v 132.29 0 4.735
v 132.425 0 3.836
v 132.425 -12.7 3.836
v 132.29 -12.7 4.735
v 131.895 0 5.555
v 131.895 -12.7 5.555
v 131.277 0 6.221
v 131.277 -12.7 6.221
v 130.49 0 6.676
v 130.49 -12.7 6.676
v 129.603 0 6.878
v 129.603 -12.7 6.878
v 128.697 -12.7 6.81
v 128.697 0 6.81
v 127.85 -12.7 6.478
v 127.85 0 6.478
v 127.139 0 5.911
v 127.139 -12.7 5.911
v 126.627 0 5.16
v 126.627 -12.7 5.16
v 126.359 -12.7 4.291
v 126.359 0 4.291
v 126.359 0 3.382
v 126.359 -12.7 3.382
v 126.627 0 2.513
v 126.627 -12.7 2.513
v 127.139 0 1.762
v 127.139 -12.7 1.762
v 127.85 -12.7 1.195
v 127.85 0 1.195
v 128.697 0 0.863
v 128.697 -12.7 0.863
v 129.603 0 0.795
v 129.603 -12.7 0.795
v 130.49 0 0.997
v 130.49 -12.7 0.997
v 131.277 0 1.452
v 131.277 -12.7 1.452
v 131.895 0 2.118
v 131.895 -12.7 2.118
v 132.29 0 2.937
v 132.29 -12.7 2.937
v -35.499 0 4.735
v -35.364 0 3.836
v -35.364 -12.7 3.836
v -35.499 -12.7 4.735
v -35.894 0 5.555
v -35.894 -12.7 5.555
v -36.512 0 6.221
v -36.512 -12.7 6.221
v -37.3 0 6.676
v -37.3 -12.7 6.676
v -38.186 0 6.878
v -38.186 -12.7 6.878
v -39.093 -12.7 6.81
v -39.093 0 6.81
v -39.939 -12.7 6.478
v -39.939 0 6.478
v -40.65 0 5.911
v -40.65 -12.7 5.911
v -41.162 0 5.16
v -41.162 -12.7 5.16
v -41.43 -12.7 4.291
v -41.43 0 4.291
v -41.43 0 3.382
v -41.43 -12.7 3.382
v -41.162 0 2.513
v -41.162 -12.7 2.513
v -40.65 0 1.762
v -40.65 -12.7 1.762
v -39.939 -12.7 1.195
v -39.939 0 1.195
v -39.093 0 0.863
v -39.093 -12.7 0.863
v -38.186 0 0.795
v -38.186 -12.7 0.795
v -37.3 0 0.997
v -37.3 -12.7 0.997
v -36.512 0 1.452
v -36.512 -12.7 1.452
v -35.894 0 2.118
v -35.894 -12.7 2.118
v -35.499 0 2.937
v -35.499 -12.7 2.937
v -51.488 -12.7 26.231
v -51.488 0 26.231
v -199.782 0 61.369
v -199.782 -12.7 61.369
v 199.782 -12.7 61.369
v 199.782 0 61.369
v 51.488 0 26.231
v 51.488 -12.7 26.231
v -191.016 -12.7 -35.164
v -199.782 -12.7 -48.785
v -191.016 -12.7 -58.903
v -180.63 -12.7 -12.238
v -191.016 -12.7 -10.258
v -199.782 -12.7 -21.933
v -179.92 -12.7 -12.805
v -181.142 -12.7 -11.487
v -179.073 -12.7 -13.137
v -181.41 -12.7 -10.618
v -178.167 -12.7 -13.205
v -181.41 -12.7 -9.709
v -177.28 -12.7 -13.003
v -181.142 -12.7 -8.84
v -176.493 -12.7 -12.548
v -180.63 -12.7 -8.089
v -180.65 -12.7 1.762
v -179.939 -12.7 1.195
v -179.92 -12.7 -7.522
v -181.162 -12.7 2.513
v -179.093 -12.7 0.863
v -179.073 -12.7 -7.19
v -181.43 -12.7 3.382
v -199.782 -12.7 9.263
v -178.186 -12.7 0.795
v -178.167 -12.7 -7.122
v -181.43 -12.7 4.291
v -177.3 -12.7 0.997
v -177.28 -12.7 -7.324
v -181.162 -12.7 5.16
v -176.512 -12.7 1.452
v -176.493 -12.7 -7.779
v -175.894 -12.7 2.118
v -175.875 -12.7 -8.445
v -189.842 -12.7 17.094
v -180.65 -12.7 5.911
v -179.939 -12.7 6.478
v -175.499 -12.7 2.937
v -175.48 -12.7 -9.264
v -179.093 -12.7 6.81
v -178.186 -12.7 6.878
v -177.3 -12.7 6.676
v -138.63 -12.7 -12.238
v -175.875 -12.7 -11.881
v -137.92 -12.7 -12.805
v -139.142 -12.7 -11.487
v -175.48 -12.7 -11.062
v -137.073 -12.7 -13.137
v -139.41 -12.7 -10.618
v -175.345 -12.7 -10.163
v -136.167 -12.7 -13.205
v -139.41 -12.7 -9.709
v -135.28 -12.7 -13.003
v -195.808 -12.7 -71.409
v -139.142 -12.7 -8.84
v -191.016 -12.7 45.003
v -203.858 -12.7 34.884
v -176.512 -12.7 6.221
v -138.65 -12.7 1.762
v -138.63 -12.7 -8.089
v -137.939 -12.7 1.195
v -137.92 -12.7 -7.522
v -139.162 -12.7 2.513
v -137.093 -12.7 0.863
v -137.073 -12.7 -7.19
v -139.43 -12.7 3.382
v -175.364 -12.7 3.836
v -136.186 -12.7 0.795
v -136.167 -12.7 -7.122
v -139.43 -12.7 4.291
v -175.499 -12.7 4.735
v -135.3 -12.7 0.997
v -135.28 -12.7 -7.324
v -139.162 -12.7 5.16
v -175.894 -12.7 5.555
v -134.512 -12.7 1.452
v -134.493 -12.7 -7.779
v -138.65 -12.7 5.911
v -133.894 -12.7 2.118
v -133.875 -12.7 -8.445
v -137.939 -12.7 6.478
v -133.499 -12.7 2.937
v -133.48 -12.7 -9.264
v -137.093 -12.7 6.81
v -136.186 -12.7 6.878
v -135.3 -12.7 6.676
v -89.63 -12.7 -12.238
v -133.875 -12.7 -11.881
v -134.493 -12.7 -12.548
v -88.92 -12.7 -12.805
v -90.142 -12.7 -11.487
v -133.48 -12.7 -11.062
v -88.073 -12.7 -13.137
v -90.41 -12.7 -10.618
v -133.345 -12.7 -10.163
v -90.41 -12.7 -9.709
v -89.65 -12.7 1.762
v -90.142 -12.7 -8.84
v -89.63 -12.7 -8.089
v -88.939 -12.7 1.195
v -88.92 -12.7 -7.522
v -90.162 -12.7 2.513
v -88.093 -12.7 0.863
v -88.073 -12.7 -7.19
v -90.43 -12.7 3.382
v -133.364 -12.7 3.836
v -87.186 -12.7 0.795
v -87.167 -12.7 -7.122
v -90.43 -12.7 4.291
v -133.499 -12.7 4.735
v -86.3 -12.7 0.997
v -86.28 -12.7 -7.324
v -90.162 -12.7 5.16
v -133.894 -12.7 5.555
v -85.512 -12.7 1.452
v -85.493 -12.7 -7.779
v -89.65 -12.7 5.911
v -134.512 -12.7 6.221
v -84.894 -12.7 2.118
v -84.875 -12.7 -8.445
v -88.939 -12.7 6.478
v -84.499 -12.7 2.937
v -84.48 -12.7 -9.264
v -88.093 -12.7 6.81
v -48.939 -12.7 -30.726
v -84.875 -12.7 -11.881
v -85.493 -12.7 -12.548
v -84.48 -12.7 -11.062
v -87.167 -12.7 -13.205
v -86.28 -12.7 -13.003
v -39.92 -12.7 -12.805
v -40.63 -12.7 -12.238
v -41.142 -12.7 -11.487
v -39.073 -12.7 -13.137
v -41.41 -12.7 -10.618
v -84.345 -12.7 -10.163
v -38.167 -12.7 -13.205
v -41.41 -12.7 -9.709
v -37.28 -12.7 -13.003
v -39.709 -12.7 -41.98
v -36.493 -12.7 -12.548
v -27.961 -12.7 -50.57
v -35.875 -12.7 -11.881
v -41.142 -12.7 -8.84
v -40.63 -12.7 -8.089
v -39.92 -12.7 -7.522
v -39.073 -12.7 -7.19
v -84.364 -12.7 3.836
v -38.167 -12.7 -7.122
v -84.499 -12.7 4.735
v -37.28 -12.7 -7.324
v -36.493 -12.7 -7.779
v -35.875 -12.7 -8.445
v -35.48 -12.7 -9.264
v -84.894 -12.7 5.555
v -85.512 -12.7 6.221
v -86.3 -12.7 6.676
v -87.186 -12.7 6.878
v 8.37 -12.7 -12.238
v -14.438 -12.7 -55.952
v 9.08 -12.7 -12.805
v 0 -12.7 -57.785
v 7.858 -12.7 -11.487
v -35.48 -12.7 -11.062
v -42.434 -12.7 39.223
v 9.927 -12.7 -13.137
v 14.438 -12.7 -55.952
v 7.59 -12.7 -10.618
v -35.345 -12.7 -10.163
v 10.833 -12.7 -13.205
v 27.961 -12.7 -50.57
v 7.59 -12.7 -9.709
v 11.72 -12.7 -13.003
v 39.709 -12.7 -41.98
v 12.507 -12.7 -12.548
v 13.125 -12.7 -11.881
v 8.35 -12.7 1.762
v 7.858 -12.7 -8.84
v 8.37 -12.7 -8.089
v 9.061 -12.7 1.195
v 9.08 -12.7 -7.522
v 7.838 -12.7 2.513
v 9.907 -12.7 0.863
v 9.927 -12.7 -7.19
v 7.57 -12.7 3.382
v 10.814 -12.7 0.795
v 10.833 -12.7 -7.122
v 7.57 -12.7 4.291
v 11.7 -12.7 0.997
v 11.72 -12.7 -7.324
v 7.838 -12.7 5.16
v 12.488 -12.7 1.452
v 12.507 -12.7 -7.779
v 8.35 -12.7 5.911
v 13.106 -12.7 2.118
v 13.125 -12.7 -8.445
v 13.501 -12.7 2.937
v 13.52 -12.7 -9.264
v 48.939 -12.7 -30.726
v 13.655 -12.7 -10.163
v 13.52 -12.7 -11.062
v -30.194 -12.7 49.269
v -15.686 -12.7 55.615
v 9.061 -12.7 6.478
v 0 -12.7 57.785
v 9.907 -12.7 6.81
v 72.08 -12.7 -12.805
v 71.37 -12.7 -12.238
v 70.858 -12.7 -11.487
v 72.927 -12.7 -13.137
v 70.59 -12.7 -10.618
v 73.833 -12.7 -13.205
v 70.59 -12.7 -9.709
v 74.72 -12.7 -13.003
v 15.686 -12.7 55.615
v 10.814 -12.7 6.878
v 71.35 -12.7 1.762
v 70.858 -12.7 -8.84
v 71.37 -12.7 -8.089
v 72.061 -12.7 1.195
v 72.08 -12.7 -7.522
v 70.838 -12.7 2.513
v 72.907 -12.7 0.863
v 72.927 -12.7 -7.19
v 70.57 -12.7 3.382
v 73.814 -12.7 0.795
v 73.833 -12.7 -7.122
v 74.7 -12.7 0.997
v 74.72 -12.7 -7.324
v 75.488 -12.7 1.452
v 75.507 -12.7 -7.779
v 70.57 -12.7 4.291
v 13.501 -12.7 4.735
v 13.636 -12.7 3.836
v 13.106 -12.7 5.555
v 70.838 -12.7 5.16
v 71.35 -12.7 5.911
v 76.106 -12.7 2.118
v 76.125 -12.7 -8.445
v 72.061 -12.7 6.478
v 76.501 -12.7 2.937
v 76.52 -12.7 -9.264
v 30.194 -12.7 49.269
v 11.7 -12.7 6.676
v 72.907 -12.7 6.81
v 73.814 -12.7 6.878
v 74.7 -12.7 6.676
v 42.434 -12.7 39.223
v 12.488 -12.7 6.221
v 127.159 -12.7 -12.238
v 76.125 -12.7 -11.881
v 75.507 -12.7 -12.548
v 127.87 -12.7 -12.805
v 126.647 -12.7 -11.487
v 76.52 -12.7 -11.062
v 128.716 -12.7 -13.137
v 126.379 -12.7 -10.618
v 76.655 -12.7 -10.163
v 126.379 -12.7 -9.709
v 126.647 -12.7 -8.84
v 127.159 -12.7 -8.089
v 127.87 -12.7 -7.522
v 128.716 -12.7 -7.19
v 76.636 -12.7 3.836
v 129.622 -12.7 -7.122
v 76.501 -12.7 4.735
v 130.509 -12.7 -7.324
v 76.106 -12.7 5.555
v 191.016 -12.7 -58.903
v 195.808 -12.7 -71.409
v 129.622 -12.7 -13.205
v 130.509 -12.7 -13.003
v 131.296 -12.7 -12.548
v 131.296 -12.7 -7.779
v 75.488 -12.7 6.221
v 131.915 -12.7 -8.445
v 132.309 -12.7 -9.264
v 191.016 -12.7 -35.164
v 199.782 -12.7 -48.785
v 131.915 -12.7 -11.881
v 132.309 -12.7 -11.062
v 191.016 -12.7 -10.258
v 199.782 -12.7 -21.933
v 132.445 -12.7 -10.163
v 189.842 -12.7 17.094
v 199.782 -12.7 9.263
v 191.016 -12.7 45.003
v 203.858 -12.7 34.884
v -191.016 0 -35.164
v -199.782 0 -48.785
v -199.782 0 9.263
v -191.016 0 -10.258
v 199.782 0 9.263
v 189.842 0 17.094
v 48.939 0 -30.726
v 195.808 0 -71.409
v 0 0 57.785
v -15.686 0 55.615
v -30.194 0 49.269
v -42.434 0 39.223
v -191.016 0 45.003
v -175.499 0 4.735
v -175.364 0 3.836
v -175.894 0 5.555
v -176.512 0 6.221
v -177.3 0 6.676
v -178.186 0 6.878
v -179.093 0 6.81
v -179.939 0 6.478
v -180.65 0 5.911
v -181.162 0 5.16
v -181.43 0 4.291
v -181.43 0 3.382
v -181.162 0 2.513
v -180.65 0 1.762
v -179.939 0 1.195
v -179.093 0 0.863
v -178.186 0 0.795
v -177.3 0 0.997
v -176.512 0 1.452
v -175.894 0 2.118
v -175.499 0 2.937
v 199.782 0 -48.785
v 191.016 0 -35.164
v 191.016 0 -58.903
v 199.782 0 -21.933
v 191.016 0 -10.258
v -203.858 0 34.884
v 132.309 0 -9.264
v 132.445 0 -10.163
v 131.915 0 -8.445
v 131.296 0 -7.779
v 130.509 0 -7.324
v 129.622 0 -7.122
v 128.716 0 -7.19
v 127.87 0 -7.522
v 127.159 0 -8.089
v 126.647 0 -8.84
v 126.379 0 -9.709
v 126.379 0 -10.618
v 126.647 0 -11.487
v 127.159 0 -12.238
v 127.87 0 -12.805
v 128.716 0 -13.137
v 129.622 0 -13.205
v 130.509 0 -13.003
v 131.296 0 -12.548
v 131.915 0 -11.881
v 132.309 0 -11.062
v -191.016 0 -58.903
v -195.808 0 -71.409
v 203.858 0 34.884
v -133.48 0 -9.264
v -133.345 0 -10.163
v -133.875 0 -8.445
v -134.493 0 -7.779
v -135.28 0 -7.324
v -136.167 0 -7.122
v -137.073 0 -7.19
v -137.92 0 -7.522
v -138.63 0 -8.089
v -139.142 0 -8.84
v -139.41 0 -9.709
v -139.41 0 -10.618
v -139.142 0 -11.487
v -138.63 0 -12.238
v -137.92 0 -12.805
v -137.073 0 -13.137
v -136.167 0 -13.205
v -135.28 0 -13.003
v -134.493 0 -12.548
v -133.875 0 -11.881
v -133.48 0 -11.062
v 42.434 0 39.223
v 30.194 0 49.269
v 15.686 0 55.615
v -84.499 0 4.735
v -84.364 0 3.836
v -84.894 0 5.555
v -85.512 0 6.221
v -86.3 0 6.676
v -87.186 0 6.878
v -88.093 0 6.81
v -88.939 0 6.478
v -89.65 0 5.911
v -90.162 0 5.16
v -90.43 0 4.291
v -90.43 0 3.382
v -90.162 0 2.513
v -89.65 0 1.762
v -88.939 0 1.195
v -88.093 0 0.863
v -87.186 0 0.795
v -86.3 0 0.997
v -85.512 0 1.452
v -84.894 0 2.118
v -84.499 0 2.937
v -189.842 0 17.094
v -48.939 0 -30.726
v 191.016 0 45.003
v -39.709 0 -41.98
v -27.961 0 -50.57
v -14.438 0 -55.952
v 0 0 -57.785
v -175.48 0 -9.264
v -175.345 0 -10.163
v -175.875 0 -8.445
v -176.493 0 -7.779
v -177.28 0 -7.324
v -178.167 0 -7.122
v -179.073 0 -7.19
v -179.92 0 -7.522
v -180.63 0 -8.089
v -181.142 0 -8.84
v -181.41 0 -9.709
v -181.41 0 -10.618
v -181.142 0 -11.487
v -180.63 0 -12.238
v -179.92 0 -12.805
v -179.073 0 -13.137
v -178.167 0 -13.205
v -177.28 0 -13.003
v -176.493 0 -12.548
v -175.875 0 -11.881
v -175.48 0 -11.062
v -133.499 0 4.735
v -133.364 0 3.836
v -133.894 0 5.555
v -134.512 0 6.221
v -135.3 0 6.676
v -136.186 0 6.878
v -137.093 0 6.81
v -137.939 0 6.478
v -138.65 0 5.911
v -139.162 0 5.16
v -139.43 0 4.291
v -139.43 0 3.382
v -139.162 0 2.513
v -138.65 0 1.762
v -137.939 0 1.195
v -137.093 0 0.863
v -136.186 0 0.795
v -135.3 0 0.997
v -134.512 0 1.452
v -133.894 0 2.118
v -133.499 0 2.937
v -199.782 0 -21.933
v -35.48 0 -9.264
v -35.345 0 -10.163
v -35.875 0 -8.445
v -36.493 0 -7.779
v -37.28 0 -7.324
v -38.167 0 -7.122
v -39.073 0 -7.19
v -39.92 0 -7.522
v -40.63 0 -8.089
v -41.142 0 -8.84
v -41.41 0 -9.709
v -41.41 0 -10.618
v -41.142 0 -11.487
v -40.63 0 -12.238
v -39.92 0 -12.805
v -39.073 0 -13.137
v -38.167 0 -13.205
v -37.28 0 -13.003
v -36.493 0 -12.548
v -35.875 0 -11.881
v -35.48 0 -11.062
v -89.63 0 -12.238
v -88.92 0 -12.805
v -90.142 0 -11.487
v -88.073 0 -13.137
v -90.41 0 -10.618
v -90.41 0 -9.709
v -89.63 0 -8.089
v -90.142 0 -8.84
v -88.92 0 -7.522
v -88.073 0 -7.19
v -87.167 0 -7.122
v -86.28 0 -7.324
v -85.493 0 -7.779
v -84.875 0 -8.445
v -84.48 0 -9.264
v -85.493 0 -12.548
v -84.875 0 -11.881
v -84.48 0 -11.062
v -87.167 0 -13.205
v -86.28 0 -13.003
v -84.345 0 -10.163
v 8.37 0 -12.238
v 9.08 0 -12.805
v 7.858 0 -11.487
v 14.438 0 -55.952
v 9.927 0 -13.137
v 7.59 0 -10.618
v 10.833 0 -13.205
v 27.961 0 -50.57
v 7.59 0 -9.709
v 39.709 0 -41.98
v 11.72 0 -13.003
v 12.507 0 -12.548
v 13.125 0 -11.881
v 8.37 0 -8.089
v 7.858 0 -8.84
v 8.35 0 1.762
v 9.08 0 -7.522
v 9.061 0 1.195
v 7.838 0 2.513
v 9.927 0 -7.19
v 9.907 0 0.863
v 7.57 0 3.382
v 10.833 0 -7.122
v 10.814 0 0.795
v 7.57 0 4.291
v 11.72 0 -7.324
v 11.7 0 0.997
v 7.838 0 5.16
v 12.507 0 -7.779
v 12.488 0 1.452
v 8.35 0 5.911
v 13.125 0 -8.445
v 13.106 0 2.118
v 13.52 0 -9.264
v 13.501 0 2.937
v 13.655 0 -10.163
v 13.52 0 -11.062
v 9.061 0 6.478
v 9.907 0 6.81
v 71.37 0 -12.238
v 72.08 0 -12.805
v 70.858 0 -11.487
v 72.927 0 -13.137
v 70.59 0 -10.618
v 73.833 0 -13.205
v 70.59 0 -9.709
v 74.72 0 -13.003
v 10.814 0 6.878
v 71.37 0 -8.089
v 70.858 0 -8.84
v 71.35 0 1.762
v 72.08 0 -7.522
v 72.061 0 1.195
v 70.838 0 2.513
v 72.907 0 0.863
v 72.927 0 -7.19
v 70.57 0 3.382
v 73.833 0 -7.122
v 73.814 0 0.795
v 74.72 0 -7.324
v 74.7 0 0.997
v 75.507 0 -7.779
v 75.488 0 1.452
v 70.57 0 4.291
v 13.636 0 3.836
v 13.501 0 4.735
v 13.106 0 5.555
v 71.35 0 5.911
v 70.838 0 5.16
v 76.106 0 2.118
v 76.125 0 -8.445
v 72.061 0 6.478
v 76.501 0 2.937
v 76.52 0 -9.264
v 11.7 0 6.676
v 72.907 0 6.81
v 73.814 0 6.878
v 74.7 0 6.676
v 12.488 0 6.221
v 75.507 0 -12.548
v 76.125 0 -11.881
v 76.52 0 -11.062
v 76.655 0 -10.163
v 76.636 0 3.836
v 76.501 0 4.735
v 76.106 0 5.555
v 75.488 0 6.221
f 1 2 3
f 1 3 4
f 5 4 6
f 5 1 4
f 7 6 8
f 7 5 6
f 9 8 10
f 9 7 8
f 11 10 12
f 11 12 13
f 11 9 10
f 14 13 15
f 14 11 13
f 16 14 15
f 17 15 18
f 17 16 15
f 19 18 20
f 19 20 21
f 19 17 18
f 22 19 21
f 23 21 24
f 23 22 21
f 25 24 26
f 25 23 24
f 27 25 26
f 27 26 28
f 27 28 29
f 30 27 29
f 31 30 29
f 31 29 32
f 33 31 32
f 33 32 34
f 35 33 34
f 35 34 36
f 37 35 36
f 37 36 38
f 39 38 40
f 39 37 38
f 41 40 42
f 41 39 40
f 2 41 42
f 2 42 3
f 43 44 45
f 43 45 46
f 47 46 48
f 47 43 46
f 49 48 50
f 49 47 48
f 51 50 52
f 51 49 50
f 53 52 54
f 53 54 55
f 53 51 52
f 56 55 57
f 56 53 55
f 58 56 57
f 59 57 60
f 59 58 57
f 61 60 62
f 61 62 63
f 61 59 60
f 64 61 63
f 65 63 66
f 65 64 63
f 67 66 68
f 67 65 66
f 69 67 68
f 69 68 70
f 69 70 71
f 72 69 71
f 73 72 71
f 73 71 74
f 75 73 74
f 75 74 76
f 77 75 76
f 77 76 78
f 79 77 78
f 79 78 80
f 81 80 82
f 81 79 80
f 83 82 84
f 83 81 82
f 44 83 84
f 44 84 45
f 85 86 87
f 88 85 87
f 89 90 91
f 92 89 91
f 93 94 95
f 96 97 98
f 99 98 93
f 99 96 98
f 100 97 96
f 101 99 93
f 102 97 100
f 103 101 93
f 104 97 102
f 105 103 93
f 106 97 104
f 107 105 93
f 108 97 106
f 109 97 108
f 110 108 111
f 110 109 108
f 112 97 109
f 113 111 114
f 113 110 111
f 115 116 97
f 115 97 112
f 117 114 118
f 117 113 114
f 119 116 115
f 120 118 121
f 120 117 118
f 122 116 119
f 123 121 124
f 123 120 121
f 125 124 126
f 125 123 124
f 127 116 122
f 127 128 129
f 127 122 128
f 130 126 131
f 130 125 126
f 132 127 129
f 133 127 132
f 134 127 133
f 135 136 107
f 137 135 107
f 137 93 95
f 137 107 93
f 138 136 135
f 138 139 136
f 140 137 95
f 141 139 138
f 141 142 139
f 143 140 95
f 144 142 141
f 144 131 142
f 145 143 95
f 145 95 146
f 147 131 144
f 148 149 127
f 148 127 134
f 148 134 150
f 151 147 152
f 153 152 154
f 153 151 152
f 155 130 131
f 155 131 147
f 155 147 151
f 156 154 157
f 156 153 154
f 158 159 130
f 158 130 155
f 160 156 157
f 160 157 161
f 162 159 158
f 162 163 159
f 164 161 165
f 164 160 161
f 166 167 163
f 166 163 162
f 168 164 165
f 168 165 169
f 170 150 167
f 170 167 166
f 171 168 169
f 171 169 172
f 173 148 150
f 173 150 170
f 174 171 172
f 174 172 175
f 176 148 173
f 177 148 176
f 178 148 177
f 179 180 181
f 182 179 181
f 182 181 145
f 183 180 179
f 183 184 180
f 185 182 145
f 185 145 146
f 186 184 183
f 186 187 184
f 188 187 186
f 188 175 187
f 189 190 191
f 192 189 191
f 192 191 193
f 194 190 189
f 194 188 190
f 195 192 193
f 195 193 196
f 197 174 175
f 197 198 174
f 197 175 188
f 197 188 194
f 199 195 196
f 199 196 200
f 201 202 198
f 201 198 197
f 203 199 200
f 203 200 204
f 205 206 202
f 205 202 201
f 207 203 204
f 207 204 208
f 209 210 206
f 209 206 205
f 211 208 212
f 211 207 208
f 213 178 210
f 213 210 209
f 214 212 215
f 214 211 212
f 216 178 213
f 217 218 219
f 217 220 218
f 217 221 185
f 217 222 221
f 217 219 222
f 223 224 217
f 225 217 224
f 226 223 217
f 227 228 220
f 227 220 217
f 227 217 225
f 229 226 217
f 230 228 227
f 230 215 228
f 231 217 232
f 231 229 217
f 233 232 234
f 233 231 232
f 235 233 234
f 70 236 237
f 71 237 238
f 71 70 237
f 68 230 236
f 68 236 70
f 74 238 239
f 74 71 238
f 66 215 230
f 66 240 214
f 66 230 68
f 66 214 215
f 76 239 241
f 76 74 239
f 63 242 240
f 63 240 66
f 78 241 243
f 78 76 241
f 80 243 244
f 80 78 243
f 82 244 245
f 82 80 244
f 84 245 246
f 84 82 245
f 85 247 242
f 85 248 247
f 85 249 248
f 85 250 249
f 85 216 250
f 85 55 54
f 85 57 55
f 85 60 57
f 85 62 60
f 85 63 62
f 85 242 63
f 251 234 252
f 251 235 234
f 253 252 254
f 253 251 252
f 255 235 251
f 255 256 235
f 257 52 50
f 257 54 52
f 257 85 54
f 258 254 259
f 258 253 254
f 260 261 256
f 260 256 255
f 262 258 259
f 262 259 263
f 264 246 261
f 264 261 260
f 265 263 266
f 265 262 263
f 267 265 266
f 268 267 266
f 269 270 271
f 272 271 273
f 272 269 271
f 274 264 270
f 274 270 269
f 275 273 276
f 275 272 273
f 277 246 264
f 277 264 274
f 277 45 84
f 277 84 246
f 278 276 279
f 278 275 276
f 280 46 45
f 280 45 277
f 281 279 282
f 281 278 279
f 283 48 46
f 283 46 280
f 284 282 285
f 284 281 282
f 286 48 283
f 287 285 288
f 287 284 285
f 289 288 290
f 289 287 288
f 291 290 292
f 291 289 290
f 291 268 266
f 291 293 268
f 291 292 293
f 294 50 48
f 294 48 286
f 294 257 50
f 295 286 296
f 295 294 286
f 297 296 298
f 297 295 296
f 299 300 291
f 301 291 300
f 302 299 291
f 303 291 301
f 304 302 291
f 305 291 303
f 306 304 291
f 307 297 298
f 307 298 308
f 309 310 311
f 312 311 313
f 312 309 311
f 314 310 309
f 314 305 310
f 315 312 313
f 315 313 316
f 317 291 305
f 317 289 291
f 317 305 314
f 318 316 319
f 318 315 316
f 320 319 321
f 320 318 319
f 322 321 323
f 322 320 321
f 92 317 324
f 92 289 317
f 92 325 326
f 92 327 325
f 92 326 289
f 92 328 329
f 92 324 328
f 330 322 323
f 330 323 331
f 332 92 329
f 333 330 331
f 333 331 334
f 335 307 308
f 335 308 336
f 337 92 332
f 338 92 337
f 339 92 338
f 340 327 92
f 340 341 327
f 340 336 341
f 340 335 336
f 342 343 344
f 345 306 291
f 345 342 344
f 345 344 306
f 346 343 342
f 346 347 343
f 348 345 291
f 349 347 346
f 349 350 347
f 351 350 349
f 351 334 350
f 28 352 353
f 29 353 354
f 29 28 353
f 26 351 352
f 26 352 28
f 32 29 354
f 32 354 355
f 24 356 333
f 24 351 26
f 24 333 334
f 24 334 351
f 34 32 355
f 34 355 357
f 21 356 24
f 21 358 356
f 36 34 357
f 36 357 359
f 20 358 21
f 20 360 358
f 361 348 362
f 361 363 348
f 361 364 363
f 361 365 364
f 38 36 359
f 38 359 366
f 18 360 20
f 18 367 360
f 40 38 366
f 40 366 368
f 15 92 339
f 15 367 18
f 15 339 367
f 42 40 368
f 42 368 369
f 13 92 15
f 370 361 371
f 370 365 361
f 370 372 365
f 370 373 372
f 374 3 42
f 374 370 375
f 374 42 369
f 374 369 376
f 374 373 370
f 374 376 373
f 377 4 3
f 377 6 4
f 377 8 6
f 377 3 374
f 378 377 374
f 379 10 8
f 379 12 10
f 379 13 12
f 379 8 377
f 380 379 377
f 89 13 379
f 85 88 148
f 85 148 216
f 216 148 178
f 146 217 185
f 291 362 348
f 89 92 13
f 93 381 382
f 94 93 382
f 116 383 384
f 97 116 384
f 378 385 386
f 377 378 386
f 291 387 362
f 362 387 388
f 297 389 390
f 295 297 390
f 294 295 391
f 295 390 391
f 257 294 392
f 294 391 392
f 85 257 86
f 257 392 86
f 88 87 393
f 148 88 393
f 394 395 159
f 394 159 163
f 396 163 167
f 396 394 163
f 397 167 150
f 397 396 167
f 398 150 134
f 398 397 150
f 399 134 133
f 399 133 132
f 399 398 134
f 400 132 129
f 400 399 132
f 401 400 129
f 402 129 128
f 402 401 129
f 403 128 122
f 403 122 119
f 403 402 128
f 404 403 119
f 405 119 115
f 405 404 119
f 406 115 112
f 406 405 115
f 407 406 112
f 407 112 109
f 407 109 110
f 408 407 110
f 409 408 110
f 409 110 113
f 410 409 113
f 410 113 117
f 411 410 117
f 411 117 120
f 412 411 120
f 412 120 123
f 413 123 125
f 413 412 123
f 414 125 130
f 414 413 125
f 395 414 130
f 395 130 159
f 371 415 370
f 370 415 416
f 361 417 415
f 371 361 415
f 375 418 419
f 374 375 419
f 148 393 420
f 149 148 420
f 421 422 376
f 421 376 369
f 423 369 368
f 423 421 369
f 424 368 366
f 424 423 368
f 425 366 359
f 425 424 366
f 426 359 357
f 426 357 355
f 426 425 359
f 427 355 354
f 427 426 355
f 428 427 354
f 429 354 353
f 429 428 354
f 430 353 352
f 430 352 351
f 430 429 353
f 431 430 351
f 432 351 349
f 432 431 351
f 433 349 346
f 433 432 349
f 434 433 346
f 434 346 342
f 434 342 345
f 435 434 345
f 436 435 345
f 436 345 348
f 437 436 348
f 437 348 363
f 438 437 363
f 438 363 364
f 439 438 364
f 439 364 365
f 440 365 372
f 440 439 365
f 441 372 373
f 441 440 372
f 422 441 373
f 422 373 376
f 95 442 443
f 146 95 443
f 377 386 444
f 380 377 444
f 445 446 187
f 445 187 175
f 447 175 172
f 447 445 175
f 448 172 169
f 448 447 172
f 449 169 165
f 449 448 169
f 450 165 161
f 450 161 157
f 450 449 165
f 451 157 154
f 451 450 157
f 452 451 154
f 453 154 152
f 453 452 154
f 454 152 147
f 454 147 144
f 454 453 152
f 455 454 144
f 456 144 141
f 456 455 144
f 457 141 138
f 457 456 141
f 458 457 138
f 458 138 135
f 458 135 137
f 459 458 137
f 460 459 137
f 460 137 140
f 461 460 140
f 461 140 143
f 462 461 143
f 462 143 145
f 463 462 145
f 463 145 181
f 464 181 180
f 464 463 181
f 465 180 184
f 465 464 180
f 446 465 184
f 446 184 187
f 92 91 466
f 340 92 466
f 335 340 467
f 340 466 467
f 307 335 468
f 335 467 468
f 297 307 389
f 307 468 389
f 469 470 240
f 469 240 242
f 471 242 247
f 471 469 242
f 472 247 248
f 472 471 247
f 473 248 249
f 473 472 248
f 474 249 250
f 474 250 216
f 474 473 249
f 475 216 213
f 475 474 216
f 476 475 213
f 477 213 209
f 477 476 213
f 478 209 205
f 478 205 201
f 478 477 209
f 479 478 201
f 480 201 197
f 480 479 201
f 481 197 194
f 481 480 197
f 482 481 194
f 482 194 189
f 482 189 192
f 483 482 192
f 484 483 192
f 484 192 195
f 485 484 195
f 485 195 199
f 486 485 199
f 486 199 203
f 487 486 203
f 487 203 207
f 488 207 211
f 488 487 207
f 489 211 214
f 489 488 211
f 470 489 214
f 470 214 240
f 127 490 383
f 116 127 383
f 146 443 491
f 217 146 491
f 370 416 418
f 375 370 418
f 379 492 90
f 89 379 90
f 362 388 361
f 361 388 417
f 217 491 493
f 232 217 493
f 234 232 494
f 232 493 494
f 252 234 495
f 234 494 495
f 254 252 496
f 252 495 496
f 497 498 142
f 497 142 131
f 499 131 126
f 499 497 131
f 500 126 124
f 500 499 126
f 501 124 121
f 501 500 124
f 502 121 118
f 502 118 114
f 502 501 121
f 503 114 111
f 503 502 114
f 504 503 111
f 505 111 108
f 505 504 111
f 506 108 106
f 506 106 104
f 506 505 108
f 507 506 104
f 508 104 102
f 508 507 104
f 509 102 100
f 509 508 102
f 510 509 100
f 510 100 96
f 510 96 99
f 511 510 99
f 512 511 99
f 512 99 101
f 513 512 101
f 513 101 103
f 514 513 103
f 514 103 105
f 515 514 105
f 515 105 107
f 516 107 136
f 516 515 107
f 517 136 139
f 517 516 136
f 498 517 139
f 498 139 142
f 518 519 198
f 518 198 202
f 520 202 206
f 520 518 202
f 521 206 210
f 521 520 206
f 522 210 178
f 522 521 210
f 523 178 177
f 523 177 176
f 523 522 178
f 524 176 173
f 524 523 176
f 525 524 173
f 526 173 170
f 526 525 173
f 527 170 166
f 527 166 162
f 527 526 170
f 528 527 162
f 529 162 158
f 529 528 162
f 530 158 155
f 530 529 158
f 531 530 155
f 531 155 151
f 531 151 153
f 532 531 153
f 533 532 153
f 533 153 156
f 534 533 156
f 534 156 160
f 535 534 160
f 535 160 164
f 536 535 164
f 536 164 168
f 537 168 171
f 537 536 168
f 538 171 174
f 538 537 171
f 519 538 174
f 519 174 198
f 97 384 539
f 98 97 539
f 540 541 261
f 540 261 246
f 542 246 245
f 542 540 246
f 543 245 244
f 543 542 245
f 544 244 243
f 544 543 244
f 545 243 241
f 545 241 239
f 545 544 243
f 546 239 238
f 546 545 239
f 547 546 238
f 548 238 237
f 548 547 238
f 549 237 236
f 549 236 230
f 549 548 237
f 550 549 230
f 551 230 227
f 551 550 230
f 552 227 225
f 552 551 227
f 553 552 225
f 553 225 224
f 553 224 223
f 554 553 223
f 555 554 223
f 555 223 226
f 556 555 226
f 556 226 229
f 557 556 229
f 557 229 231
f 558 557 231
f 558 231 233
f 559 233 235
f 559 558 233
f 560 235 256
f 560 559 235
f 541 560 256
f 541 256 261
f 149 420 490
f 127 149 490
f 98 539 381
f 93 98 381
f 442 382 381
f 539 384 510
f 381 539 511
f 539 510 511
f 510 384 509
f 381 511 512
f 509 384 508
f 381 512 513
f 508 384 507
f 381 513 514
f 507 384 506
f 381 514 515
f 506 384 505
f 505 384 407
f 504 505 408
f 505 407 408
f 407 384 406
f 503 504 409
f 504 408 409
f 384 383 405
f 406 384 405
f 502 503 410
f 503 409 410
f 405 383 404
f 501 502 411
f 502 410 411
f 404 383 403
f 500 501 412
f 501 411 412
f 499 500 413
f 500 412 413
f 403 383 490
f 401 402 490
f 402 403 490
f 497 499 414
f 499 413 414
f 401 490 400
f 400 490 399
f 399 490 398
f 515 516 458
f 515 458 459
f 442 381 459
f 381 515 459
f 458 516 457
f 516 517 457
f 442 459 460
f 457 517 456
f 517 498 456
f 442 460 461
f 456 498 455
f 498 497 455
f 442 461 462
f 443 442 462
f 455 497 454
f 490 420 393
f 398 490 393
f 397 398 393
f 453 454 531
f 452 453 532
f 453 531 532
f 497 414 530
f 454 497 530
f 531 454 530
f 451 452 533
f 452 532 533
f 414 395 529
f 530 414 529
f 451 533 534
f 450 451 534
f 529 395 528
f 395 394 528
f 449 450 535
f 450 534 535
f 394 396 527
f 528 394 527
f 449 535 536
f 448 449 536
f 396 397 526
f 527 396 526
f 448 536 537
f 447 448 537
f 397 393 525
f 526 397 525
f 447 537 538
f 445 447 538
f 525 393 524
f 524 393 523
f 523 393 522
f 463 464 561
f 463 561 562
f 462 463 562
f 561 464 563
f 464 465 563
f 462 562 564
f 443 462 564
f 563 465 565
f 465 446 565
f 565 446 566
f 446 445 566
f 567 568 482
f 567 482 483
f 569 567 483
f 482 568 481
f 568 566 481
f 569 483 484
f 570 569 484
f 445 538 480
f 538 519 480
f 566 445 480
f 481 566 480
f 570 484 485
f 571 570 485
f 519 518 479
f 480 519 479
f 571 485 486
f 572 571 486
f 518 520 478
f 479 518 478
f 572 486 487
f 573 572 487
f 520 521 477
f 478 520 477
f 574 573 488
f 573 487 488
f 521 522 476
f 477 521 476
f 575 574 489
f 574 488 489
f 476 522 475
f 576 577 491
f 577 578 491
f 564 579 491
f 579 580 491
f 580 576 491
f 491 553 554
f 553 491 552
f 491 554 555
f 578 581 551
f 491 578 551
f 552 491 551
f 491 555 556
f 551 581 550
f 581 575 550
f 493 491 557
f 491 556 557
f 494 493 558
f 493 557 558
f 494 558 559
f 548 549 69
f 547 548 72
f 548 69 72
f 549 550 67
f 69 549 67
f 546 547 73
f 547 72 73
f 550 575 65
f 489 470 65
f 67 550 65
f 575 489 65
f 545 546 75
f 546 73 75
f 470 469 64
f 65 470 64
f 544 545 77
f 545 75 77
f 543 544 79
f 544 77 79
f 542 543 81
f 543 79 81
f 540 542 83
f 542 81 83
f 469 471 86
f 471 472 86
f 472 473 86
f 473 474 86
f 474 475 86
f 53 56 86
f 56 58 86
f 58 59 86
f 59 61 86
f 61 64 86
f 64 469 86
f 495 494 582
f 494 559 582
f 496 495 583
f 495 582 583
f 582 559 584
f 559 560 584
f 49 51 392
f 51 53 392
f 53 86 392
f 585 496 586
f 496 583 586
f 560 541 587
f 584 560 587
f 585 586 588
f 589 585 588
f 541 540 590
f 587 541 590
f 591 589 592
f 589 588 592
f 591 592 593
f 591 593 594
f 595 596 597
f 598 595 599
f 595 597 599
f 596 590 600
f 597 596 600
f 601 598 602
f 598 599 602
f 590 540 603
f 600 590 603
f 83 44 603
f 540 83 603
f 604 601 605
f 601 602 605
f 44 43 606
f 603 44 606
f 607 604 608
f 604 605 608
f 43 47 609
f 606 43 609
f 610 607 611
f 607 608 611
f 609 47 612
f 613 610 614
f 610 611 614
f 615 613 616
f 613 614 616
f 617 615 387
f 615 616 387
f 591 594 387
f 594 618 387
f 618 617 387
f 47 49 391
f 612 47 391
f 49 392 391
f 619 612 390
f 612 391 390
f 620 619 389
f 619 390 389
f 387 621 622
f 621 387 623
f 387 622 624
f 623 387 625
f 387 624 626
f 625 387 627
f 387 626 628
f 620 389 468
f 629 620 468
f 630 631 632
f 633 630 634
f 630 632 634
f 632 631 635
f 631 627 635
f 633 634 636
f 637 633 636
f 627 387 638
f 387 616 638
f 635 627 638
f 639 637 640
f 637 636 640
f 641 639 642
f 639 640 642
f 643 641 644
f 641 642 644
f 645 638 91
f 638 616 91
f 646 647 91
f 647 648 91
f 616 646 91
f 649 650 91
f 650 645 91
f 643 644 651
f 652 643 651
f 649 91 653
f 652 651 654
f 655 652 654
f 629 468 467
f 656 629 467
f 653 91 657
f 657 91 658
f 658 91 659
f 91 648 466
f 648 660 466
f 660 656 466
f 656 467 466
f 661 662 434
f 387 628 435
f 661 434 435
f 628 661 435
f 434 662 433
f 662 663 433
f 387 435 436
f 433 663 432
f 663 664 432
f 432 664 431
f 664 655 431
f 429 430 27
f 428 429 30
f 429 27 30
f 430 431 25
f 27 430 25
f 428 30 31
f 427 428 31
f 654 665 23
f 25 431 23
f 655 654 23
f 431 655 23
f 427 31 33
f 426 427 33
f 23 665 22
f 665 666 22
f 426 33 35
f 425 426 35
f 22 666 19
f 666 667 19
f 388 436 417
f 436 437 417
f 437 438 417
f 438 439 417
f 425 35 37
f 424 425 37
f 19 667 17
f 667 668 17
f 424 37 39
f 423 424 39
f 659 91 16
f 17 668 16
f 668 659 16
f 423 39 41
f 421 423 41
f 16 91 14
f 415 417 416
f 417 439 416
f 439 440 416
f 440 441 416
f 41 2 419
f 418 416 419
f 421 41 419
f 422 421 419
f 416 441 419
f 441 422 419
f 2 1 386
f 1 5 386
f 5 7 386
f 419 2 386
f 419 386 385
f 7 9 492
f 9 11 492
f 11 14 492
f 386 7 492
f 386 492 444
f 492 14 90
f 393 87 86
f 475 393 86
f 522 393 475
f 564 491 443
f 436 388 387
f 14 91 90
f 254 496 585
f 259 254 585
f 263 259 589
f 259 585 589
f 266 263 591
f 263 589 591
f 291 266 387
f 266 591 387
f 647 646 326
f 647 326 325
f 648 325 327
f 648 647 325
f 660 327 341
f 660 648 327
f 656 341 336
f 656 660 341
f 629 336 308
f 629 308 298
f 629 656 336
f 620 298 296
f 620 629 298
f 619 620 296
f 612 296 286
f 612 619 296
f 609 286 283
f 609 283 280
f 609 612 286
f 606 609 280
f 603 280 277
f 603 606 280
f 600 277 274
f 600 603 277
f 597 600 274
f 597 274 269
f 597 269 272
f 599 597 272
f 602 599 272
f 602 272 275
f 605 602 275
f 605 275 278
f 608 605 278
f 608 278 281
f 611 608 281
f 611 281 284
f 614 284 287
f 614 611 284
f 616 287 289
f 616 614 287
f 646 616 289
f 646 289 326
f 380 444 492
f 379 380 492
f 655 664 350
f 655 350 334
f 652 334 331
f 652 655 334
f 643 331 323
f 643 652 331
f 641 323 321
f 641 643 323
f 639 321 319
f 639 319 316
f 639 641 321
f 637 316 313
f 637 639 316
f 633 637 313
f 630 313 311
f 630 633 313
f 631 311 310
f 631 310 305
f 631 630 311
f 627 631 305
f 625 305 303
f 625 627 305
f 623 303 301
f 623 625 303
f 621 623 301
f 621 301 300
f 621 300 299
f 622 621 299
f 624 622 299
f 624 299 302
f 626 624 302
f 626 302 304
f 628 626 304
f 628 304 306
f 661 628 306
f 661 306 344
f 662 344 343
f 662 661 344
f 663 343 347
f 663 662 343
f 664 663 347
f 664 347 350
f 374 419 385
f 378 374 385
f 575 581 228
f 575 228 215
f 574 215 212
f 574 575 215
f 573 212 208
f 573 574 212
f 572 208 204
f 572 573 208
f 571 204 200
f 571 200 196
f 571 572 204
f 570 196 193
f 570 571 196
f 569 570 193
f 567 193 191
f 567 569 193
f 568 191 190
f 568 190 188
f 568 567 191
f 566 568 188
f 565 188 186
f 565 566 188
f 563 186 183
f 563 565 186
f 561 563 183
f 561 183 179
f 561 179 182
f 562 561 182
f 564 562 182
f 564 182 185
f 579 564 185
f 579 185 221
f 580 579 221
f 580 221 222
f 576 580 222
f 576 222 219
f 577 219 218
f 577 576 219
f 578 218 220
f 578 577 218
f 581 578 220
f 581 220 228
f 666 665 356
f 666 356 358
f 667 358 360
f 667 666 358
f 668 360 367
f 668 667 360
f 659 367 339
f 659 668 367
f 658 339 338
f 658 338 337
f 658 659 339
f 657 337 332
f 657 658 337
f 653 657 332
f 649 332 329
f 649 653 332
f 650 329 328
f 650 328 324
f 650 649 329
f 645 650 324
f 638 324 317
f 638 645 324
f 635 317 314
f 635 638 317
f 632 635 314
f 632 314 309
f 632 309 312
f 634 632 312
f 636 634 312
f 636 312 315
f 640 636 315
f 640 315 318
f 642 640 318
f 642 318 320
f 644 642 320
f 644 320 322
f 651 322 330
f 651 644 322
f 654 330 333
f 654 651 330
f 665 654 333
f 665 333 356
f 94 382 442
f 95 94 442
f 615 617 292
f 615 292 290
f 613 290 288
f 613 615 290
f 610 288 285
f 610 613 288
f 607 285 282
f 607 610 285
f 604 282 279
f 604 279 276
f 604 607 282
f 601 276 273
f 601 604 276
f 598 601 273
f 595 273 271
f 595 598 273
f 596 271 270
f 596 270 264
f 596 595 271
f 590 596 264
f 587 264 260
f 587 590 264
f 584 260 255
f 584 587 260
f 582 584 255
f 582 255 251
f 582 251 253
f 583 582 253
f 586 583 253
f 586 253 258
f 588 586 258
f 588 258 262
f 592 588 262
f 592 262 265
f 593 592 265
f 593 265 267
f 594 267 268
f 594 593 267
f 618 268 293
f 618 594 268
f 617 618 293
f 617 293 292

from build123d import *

# Parameters (mm, degrees)
F0_R     = 3.05
F1_DEPTH = 12.7


with BuildPart() as f1:
    # F0 (on Front) → F1 (new body)
    with BuildSketch(Plane.XZ):
        with BuildLine():
            ThreePointArc((51.488186, 26.23139), (30.193835, 49.269174), (0, 57.785112))
            ThreePointArc((0, 57.785112), (-30.193835, 49.269174), (-51.488186, 26.23139))
            Line((-51.488186, 26.23139), (-199.782062, 61.369492))
            Line((-199.782062, 61.369492), (-191.015825, 45.002539))
            Line((-191.015825, 45.002539), (-203.858078, 34.884386))
            Line((-203.858078, 34.884386), (-189.841708, 17.094403))
            Line((-189.841708, 17.094403), (-199.782062, 9.262597))
            Line((-199.782062, 9.262597), (-191.015825, -10.25812))
            Line((-191.015825, -10.25812), (-199.782062, -21.932906))
            Line((-199.782062, -21.932906), (-191.015825, -35.16433))
            Line((-191.015825, -35.16433), (-199.782062, -48.784915))
            Line((-199.782062, -48.784915), (-191.015825, -58.903065))
            Line((-191.015825, -58.903065), (-195.808372, -71.409119))
            Line((-195.808372, -71.409119), (-48.938758, -30.726488))
            ThreePointArc((-48.938758, -30.726488), (-27.960558, -50.570014), (0, -57.785112))
            ThreePointArc((0, -57.785112), (27.960558, -50.570014), (48.938758, -30.726488))
            Line((48.938758, -30.726488), (195.808372, -71.409119))
            Line((195.808372, -71.409119), (191.015825, -58.903065))
            Line((191.015825, -58.903065), (199.782062, -48.784915))
            Line((199.782062, -48.784915), (191.015825, -35.16433))
            Line((191.015825, -35.16433), (199.782062, -21.932906))
            Line((199.782062, -21.932906), (191.015825, -10.25812))
            Line((191.015825, -10.25812), (199.782062, 9.262597))
            Line((199.782062, 9.262597), (189.841708, 17.094403))
            Line((189.841708, 17.094403), (203.858078, 34.884386))
            Line((203.858078, 34.884386), (191.015825, 45.002539))
            Line((191.015825, 45.002539), (199.782062, 61.369492))
            Line((199.782062, 61.369492), (51.488186, 26.23139))
        make_face()
        with Locations((-178.394541, -10.163349)):
            Circle(F0_R, mode=Mode.SUBTRACT)
        with Locations((-136.394541, -10.163349)):
            Circle(F0_R, mode=Mode.SUBTRACT)
        with Locations((-87.394541, -10.163349)):
            Circle(F0_R, mode=Mode.SUBTRACT)
        with Locations((-38.394541, -10.163349)):
            Circle(F0_R, mode=Mode.SUBTRACT)
        with Locations((10.605459, -10.163349)):
            Circle(F0_R, mode=Mode.SUBTRACT)
        with Locations((73.605459, -10.163349)):
            Circle(F0_R, mode=Mode.SUBTRACT)
        with Locations((129.394541, -10.163349)):
            Circle(F0_R, mode=Mode.SUBTRACT)
        with Locations((-178.413816, 3.836376)):
            Circle(F0_R, mode=Mode.SUBTRACT)
        with Locations((-136.413816, 3.836376)):
            Circle(F0_R, mode=Mode.SUBTRACT)
        with Locations((-87.413816, 3.836376)):
            Circle(F0_R, mode=Mode.SUBTRACT)
        with Locations((-38.413816, 3.836376)):
            Circle(F0_R, mode=Mode.SUBTRACT)
        with Locations((10.586184, 3.836376)):
            Circle(F0_R, mode=Mode.SUBTRACT)
        with Locations((73.586184, 3.836376)):
            Circle(F0_R, mode=Mode.SUBTRACT)
        with Locations((129.375266, 3.836376)):
            Circle(F0_R, mode=Mode.SUBTRACT)
    extrude(amount=F1_DEPTH)


solid = f1.part
